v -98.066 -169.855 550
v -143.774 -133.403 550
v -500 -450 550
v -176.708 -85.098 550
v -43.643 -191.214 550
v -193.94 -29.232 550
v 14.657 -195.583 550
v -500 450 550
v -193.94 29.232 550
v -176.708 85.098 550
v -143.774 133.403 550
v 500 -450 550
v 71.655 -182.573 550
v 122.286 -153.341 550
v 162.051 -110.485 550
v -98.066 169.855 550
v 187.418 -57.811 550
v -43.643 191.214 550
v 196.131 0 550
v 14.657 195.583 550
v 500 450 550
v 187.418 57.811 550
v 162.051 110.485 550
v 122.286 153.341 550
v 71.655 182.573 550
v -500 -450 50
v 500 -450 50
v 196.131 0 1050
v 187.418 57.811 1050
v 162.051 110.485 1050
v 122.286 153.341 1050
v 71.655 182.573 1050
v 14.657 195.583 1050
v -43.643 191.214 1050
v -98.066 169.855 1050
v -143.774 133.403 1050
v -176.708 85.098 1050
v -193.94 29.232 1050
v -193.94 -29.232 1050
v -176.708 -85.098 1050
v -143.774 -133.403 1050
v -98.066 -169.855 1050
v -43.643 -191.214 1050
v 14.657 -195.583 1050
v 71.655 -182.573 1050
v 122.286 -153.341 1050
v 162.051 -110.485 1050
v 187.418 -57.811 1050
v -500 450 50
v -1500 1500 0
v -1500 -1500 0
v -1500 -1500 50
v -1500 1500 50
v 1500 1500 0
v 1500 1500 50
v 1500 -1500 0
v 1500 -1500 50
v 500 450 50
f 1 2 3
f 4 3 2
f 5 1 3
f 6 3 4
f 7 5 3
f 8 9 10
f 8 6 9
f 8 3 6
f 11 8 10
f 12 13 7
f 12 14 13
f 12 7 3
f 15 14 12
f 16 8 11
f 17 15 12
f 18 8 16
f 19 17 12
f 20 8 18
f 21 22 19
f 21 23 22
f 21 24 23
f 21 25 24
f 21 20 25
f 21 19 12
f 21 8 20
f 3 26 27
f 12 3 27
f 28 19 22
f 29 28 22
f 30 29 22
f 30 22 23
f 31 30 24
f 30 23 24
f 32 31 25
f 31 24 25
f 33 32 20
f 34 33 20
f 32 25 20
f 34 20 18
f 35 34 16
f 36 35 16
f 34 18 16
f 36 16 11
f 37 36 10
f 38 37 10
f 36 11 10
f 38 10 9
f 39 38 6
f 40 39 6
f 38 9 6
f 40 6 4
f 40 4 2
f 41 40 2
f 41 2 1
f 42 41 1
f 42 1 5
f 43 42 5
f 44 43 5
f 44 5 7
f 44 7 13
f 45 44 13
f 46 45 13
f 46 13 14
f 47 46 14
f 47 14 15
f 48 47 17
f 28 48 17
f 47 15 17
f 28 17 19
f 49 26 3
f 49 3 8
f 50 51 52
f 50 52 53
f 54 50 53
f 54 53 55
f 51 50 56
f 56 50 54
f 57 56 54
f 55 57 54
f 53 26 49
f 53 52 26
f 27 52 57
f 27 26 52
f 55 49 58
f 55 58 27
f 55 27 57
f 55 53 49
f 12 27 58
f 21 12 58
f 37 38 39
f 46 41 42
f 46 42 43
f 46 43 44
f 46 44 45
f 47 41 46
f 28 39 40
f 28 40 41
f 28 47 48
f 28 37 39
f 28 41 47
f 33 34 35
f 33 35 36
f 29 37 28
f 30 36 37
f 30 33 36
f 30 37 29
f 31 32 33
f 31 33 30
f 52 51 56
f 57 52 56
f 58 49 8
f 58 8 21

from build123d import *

# Parameters (mm, degrees)
SKETCH_1_W      = 3000
SKETCH_1_H      = 3000
EXTRUDE_1_DEPTH = 50
SKETCH_2_W      = 1000
SKETCH_2_H      = 900
EXTRUDE_2_DEPTH = 500
SKETCH_3_R      = 196.131085291
EXTRUDE_3_DEPTH = 500


with BuildPart() as part:
    # 草圖1 → 填料-伸長1 (new body)
    with BuildSketch(Plane.XY):
        Rectangle(SKETCH_1_W, SKETCH_1_H)
    extrude(amount=EXTRUDE_1_DEPTH)

    # 草圖2 → 填料-伸長2 (add)
    with BuildSketch(Plane.XY.offset(50)):
        Rectangle(SKETCH_2_W, SKETCH_2_H)
    extrude(amount=EXTRUDE_2_DEPTH)

    # 草圖3 → 填料-伸長3 (add)
    with BuildSketch(Plane.XY.offset(550)):
        Circle(SKETCH_3_R)
    extrude(amount=EXTRUDE_3_DEPTH)


solid = part.part
